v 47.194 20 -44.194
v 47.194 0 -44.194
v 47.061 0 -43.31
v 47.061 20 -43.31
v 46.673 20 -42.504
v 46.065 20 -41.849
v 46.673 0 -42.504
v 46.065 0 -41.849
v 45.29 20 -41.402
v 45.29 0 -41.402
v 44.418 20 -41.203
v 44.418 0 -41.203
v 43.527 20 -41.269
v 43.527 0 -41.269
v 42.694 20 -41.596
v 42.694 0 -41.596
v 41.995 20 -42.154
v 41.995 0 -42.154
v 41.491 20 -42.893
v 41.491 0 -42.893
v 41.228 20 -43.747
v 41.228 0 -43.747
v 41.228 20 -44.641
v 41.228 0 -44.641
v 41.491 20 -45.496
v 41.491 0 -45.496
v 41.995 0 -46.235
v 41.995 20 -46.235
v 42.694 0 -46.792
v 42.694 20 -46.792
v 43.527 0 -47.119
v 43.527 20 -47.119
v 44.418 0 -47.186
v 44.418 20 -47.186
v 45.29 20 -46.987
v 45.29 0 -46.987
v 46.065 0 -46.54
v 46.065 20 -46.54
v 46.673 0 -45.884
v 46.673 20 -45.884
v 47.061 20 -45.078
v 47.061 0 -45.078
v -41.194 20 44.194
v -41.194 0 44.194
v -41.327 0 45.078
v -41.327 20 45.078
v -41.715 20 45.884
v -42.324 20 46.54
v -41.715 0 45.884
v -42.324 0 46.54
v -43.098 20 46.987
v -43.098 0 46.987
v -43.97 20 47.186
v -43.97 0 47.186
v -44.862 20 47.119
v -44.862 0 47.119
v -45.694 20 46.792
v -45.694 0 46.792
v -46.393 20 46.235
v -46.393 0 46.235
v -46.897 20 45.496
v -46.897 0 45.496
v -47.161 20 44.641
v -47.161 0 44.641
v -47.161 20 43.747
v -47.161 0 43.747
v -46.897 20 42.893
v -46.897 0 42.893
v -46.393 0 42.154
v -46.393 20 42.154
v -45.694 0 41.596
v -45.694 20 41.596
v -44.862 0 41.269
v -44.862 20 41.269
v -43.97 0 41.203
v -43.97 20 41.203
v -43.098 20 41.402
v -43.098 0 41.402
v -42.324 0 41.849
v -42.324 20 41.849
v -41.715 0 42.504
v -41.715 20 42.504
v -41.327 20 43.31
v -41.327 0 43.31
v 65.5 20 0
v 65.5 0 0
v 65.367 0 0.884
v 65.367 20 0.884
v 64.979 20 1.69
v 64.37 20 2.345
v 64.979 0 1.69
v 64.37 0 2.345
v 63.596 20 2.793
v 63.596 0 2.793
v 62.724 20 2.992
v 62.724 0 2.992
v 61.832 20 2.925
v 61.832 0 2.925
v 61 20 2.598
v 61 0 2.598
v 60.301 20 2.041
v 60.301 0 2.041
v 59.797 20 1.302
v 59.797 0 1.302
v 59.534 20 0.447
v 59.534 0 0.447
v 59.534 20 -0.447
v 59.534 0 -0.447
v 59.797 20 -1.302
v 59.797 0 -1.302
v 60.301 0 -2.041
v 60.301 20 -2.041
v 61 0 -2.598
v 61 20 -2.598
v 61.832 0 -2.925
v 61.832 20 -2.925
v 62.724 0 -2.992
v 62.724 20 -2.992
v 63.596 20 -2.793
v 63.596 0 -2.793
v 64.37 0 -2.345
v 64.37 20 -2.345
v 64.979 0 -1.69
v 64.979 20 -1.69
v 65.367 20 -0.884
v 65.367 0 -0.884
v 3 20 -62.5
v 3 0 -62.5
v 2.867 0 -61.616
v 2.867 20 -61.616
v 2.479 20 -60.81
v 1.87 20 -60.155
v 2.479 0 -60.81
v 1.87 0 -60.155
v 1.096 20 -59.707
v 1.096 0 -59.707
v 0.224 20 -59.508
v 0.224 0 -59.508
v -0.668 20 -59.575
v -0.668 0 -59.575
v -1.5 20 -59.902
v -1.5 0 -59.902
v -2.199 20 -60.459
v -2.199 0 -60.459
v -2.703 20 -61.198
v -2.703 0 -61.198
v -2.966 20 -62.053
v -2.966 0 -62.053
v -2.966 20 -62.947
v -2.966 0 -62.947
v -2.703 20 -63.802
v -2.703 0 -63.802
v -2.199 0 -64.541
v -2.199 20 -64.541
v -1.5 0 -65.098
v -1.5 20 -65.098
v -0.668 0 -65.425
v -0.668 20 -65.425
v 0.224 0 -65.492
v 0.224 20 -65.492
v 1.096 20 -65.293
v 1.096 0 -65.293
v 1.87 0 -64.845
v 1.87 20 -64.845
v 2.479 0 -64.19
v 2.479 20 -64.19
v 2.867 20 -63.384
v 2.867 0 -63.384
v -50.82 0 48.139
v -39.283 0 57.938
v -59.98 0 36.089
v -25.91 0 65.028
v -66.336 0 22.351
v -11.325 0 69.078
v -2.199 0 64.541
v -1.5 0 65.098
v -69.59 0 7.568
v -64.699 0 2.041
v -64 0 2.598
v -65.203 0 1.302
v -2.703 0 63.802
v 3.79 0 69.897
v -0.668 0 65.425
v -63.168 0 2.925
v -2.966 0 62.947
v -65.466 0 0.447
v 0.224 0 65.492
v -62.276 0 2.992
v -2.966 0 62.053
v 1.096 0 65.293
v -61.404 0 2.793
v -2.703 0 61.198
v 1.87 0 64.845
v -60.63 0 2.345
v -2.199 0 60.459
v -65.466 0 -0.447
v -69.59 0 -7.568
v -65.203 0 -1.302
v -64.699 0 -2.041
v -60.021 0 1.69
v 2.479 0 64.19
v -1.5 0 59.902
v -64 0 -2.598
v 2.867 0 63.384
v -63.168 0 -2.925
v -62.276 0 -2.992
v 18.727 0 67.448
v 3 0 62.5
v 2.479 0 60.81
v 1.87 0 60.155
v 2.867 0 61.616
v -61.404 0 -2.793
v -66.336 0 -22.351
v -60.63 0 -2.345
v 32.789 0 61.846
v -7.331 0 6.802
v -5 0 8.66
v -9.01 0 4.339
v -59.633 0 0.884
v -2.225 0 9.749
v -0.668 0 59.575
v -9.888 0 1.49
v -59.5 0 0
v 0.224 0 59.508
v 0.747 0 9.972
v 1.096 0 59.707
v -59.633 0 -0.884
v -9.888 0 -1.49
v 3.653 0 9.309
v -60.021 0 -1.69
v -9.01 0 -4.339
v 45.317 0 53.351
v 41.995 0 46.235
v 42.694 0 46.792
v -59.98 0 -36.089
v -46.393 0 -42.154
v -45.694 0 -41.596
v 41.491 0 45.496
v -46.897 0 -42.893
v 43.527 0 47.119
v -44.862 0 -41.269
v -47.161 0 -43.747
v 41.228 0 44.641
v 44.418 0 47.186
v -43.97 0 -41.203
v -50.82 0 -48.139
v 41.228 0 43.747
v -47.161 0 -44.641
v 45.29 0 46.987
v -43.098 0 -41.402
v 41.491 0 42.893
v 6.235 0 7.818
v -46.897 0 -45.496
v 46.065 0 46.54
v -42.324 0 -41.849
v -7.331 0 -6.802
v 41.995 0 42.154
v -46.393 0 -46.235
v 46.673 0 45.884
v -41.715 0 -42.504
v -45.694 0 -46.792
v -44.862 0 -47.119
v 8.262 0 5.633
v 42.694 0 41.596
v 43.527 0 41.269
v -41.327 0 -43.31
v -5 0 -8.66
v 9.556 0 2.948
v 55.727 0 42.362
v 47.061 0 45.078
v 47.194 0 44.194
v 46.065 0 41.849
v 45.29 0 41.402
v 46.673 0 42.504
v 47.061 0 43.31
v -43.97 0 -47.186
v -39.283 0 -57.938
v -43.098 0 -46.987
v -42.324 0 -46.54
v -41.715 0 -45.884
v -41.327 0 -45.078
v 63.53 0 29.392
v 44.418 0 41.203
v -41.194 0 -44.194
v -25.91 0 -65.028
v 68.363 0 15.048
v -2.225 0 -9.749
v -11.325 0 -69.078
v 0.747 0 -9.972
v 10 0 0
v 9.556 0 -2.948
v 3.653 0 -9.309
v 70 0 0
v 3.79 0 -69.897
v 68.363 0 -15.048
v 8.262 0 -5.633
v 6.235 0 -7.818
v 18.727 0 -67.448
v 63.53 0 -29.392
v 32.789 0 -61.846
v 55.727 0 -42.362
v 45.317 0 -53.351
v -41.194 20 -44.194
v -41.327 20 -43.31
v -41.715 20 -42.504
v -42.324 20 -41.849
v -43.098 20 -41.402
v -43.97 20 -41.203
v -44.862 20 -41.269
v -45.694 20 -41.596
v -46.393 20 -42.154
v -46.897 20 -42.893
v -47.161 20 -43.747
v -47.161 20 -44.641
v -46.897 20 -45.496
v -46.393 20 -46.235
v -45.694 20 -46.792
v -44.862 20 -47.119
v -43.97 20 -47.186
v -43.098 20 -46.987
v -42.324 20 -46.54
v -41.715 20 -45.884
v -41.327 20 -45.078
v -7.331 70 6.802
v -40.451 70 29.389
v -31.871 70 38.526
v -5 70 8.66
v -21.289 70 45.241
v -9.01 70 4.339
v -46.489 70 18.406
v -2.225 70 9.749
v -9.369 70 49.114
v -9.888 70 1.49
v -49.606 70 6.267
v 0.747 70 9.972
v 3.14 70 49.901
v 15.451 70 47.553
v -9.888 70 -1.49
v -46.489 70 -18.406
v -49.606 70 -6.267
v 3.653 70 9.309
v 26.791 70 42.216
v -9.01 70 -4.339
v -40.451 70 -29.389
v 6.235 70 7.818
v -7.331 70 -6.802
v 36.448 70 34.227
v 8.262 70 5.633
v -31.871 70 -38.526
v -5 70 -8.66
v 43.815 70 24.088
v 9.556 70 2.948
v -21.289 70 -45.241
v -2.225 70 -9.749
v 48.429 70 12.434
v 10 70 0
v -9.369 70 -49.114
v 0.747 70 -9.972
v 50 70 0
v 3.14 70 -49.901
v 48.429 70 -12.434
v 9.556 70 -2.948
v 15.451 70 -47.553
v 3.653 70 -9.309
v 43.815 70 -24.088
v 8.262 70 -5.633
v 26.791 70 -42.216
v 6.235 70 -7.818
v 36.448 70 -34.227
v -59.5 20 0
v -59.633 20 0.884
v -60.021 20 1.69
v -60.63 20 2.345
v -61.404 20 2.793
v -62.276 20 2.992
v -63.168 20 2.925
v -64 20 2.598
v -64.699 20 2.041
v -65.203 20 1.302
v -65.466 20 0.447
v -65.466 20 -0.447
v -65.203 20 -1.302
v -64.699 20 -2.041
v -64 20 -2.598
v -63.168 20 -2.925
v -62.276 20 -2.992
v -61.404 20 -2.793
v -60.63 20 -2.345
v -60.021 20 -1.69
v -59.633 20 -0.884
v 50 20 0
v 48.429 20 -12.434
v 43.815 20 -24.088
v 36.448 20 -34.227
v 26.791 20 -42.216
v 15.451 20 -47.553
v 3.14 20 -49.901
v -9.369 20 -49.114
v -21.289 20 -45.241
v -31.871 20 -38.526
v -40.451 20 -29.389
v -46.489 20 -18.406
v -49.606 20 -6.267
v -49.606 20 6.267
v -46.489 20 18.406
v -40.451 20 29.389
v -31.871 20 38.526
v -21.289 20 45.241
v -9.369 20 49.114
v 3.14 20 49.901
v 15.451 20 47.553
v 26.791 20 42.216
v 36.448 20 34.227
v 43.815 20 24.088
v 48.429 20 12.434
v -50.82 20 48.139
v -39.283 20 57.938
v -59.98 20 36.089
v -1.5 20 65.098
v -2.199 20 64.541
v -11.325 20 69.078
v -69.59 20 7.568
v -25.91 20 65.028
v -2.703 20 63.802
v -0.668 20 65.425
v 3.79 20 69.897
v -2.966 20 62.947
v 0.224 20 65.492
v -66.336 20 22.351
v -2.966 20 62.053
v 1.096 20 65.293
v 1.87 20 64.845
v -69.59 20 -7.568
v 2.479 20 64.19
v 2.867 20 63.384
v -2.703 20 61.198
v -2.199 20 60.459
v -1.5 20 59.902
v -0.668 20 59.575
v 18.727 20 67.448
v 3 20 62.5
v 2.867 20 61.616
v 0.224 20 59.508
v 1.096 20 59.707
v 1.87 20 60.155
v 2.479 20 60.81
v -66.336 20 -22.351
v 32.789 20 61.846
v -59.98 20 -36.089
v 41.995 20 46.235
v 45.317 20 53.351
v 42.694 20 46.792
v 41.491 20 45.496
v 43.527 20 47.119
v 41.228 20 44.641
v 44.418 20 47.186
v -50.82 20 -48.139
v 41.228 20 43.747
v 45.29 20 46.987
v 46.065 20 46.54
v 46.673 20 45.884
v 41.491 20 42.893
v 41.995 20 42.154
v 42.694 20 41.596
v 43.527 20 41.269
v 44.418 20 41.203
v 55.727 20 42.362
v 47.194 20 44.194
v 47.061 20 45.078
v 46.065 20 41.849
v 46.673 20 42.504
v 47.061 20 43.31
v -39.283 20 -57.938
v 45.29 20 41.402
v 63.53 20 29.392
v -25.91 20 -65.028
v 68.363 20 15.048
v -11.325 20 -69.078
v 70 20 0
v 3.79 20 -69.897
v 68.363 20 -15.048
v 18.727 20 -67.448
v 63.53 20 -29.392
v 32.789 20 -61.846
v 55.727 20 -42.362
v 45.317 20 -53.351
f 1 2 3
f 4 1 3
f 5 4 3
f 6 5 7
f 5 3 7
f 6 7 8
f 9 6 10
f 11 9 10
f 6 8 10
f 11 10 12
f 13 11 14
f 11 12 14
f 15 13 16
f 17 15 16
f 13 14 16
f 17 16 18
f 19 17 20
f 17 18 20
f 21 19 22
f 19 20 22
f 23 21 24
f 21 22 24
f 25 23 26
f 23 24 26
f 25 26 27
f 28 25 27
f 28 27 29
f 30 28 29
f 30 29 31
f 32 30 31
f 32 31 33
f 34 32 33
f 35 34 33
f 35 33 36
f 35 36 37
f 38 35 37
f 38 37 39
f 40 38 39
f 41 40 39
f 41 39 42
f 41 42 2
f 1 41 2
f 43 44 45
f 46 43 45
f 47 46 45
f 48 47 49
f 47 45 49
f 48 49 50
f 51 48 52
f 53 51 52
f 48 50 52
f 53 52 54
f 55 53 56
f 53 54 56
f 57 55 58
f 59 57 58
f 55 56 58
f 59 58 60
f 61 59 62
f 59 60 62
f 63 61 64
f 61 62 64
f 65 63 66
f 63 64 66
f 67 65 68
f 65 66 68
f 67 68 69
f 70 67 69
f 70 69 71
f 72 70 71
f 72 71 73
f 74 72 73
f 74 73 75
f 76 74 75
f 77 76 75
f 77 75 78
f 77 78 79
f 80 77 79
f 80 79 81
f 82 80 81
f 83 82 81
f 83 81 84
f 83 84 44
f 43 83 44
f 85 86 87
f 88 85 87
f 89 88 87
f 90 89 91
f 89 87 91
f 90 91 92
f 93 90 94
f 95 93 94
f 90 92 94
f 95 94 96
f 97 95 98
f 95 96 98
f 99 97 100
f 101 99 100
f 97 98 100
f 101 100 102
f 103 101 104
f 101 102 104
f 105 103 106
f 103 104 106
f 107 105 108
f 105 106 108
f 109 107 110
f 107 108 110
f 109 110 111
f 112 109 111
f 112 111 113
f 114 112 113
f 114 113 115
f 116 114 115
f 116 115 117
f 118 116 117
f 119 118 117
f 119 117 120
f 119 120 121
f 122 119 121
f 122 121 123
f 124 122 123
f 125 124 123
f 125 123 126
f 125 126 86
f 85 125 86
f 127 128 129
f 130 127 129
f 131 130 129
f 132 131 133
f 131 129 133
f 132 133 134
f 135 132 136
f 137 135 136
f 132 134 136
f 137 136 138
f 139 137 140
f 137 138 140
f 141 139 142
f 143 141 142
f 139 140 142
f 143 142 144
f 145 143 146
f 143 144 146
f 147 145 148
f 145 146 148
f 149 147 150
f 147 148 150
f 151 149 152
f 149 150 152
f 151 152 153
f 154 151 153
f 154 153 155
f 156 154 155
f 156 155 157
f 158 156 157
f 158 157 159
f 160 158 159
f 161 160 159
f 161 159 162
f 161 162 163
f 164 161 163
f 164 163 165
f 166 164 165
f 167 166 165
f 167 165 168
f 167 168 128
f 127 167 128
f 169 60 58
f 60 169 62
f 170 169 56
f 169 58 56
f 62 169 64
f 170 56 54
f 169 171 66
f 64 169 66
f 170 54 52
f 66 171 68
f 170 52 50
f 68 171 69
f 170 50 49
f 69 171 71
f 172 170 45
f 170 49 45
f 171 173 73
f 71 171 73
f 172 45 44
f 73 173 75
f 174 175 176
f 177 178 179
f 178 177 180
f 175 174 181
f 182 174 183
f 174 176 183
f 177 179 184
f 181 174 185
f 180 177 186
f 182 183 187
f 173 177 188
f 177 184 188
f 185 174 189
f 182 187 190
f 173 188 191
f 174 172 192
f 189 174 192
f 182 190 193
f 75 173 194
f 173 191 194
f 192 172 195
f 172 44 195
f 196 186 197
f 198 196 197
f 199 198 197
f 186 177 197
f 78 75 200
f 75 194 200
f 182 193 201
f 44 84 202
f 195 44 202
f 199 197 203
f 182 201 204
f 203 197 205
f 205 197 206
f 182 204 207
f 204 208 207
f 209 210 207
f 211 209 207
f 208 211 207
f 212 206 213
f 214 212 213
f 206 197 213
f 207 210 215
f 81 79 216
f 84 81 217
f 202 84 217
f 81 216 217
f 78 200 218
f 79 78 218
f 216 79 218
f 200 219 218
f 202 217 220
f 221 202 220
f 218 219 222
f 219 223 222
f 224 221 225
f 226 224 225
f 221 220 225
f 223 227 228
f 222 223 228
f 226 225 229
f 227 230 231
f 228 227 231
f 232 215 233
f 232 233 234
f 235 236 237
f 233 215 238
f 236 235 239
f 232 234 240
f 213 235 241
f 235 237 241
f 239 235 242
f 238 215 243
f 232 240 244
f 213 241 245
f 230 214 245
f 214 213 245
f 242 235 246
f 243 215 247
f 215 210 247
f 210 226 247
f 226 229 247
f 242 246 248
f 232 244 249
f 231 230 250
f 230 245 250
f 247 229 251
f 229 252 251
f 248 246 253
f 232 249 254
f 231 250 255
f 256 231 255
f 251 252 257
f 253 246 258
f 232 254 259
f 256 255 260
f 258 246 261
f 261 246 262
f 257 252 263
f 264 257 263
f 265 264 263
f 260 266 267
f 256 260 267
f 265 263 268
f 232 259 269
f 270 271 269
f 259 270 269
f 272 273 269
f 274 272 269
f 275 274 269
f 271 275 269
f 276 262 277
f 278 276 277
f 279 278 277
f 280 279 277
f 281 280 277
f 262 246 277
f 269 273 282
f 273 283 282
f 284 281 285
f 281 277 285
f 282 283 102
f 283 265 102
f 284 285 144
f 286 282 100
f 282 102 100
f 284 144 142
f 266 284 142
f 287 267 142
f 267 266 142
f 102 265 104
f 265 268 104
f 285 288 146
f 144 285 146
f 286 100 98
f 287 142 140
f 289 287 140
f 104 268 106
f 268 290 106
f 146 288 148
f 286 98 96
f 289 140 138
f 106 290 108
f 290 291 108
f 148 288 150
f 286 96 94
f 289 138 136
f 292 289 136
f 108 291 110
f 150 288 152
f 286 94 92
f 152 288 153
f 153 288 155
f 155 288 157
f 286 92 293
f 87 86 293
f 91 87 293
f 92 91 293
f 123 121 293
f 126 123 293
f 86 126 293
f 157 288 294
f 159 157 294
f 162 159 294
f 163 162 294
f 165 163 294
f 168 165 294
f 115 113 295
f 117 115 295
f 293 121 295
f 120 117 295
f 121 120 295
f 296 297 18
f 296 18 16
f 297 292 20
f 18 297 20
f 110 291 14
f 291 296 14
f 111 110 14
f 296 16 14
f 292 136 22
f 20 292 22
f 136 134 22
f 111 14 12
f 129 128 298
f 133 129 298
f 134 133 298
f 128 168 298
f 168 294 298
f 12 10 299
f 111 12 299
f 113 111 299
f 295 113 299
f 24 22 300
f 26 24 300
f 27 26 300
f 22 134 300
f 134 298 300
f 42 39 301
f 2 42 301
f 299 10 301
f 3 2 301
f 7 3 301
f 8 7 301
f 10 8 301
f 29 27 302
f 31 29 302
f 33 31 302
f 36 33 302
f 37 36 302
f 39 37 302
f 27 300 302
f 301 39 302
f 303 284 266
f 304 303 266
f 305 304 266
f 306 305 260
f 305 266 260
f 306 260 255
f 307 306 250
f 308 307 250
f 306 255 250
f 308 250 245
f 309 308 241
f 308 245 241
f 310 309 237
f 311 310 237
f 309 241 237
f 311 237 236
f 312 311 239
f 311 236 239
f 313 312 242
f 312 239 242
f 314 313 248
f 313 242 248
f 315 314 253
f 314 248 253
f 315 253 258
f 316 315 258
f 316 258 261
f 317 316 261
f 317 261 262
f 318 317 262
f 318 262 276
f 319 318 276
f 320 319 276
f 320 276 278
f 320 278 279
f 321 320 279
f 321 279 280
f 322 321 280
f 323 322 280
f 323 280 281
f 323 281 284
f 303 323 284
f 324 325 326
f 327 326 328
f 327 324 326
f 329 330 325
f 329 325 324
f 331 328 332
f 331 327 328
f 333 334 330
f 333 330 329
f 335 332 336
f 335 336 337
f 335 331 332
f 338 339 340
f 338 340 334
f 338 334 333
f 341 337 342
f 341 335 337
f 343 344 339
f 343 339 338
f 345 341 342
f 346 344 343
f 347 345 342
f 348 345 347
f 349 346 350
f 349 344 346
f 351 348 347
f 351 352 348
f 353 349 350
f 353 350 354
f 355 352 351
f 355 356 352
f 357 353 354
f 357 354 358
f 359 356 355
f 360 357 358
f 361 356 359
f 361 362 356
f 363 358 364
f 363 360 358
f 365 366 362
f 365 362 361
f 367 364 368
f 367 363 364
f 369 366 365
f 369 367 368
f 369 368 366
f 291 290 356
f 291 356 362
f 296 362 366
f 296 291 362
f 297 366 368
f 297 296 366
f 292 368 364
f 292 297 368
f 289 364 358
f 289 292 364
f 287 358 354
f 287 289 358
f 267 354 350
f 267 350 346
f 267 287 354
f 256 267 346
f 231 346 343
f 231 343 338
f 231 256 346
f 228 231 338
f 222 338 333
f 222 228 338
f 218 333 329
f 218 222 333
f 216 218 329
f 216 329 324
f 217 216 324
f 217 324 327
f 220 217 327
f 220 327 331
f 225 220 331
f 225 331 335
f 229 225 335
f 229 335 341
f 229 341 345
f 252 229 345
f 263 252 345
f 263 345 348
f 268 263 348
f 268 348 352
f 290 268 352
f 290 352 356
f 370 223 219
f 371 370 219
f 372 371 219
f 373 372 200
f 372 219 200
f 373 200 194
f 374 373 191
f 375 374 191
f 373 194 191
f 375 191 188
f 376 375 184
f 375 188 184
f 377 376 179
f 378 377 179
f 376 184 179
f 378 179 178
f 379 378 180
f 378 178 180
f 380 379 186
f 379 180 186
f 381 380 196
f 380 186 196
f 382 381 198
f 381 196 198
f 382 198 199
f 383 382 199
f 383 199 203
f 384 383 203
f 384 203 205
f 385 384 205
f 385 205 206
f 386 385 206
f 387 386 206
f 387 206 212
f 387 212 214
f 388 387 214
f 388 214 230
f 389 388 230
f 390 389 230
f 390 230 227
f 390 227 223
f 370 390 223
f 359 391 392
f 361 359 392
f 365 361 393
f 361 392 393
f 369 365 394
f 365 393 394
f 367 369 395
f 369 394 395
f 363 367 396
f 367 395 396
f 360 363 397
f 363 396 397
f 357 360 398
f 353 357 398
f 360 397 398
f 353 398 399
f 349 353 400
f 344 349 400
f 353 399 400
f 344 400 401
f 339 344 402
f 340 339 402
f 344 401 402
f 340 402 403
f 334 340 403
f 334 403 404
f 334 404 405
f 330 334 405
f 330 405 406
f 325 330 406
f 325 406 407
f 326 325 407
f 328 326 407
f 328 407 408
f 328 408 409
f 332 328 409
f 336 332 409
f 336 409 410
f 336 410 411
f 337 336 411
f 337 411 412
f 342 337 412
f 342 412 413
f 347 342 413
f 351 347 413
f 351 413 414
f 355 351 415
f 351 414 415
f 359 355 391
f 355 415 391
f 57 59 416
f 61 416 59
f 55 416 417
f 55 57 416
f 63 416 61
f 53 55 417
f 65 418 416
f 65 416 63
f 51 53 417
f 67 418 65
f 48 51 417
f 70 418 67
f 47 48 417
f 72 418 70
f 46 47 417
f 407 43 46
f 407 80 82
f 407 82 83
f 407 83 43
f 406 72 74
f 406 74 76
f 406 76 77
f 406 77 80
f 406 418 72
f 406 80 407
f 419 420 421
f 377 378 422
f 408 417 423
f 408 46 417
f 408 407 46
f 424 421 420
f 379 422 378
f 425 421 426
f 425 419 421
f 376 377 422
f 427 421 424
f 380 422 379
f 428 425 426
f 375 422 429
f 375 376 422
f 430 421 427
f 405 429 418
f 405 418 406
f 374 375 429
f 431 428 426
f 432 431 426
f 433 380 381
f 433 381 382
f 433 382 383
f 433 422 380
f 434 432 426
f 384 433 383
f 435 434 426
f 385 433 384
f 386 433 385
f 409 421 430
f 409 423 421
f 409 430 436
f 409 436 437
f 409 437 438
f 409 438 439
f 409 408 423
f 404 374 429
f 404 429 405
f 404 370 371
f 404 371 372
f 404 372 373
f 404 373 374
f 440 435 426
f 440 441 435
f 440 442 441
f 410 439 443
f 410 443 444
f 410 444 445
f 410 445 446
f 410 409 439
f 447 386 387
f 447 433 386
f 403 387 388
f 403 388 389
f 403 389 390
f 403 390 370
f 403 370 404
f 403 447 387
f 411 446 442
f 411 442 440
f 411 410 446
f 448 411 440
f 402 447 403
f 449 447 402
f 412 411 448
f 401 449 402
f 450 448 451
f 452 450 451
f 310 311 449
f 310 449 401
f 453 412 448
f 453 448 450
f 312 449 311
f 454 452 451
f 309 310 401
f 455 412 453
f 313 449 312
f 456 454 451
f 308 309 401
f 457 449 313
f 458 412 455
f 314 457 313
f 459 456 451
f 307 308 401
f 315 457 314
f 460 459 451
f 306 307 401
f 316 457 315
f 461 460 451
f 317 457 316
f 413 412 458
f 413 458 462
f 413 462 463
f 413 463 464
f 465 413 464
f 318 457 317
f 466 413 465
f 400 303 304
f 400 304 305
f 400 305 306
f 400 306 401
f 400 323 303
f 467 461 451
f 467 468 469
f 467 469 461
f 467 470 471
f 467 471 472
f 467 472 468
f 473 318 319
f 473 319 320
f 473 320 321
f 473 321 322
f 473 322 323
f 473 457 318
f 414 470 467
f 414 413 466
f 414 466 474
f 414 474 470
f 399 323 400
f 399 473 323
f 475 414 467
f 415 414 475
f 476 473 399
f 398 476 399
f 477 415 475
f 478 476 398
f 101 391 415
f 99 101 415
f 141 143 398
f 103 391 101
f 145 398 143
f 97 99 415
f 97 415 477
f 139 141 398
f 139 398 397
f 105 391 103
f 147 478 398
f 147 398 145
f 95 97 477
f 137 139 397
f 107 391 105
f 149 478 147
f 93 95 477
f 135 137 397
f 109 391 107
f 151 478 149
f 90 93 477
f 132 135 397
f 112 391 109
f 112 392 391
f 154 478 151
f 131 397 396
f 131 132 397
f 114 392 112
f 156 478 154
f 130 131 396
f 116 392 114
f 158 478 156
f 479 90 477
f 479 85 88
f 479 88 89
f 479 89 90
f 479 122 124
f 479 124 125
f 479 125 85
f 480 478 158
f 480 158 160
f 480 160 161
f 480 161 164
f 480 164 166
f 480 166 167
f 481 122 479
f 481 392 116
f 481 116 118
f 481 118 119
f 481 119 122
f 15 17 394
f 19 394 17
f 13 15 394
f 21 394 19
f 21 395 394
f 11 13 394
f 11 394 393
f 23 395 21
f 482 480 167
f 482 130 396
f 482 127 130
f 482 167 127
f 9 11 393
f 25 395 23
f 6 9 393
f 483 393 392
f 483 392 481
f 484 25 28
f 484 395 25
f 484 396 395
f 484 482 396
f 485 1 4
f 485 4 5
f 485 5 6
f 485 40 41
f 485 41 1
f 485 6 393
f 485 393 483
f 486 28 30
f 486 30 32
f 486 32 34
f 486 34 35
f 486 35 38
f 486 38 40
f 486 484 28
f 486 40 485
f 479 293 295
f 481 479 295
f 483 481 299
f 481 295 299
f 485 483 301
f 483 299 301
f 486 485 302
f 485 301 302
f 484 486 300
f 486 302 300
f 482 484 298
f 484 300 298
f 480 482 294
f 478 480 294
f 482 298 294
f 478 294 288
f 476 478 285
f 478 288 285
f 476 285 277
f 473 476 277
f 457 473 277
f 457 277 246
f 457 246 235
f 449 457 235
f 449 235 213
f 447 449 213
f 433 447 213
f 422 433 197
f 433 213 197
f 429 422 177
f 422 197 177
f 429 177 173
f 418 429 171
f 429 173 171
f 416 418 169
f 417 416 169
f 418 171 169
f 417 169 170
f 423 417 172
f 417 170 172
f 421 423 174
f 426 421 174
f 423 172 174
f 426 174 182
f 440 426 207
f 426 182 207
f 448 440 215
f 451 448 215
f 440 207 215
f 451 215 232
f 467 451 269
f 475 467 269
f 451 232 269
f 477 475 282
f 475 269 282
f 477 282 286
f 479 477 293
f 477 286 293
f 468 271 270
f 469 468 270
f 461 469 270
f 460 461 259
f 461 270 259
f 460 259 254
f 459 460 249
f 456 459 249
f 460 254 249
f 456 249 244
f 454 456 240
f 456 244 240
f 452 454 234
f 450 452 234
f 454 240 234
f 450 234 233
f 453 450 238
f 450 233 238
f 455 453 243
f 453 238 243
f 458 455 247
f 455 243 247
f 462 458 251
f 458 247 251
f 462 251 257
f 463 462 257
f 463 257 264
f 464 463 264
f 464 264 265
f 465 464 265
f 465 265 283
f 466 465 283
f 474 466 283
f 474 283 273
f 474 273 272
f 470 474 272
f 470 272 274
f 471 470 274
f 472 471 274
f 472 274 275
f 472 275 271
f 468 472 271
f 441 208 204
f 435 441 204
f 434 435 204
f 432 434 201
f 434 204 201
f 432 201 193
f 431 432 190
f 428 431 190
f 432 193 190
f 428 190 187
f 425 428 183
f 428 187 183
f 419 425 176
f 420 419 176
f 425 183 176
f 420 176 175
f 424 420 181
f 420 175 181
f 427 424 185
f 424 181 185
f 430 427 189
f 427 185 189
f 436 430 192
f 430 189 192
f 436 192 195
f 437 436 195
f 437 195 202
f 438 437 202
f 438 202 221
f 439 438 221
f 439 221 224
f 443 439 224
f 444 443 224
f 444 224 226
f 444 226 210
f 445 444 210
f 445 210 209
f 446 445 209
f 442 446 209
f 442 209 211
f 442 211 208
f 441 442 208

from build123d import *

# Parameters (mm, degrees)
SKETCH1_R           = 70
SKETCH1_R_2         = 10
BOSS_EXTRUDE1_DEPTH = 20
SKETCH1_3_R         = 50
SKETCH1_3_R_2       = 10
BOSS_EXTRUDE2_DEPTH = 70
SKETCH2_R           = 3
CUT_EXTRUDE1_DEPTH  = 122.24355653


with BuildPart() as part:
    # Sketch1 → Boss-Extrude1 (new body)
    with BuildSketch(Plane(origin=(0, 0, 0), x_dir=(1, 0, 0), z_dir=(0, 1, 0))):
        Circle(SKETCH1_R)
        Circle(SKETCH1_R_2, mode=Mode.SUBTRACT)
    extrude(amount=BOSS_EXTRUDE1_DEPTH)

    # Sketch1<3> → Boss-Extrude2 (add)
    with BuildSketch(Plane(origin=(0, 0, 0), x_dir=(1, 0, 0), z_dir=(0, 1, 0))):
        Circle(SKETCH1_3_R)
        Circle(SKETCH1_3_R_2, mode=Mode.SUBTRACT)
    extrude(amount=BOSS_EXTRUDE2_DEPTH)

    # Sketch2 → Cut-Extrude1 (cut, through all)
    with BuildSketch(Plane.XZ):
        with Locations((0, 62.5)):
            Circle(SKETCH2_R)
        with Locations((-44.194173824, 44.194173824)):
            Circle(SKETCH2_R)
        with Locations((44.194173824, 44.194173824)):
            Circle(SKETCH2_R)
        with Locations((-62.5, 0)):
            Circle(SKETCH2_R)
        with Locations((62.5, 0)):
            Circle(SKETCH2_R)
        with Locations((-44.194173824, -44.194173824)):
            Circle(SKETCH2_R)
        with Locations((44.194173824, -44.194173824)):
            Circle(SKETCH2_R)
        with Locations((0, -62.5)):
            Circle(SKETCH2_R)
    extrude(amount=-CUT_EXTRUDE1_DEPTH, mode=Mode.SUBTRACT)


solid = part.part
